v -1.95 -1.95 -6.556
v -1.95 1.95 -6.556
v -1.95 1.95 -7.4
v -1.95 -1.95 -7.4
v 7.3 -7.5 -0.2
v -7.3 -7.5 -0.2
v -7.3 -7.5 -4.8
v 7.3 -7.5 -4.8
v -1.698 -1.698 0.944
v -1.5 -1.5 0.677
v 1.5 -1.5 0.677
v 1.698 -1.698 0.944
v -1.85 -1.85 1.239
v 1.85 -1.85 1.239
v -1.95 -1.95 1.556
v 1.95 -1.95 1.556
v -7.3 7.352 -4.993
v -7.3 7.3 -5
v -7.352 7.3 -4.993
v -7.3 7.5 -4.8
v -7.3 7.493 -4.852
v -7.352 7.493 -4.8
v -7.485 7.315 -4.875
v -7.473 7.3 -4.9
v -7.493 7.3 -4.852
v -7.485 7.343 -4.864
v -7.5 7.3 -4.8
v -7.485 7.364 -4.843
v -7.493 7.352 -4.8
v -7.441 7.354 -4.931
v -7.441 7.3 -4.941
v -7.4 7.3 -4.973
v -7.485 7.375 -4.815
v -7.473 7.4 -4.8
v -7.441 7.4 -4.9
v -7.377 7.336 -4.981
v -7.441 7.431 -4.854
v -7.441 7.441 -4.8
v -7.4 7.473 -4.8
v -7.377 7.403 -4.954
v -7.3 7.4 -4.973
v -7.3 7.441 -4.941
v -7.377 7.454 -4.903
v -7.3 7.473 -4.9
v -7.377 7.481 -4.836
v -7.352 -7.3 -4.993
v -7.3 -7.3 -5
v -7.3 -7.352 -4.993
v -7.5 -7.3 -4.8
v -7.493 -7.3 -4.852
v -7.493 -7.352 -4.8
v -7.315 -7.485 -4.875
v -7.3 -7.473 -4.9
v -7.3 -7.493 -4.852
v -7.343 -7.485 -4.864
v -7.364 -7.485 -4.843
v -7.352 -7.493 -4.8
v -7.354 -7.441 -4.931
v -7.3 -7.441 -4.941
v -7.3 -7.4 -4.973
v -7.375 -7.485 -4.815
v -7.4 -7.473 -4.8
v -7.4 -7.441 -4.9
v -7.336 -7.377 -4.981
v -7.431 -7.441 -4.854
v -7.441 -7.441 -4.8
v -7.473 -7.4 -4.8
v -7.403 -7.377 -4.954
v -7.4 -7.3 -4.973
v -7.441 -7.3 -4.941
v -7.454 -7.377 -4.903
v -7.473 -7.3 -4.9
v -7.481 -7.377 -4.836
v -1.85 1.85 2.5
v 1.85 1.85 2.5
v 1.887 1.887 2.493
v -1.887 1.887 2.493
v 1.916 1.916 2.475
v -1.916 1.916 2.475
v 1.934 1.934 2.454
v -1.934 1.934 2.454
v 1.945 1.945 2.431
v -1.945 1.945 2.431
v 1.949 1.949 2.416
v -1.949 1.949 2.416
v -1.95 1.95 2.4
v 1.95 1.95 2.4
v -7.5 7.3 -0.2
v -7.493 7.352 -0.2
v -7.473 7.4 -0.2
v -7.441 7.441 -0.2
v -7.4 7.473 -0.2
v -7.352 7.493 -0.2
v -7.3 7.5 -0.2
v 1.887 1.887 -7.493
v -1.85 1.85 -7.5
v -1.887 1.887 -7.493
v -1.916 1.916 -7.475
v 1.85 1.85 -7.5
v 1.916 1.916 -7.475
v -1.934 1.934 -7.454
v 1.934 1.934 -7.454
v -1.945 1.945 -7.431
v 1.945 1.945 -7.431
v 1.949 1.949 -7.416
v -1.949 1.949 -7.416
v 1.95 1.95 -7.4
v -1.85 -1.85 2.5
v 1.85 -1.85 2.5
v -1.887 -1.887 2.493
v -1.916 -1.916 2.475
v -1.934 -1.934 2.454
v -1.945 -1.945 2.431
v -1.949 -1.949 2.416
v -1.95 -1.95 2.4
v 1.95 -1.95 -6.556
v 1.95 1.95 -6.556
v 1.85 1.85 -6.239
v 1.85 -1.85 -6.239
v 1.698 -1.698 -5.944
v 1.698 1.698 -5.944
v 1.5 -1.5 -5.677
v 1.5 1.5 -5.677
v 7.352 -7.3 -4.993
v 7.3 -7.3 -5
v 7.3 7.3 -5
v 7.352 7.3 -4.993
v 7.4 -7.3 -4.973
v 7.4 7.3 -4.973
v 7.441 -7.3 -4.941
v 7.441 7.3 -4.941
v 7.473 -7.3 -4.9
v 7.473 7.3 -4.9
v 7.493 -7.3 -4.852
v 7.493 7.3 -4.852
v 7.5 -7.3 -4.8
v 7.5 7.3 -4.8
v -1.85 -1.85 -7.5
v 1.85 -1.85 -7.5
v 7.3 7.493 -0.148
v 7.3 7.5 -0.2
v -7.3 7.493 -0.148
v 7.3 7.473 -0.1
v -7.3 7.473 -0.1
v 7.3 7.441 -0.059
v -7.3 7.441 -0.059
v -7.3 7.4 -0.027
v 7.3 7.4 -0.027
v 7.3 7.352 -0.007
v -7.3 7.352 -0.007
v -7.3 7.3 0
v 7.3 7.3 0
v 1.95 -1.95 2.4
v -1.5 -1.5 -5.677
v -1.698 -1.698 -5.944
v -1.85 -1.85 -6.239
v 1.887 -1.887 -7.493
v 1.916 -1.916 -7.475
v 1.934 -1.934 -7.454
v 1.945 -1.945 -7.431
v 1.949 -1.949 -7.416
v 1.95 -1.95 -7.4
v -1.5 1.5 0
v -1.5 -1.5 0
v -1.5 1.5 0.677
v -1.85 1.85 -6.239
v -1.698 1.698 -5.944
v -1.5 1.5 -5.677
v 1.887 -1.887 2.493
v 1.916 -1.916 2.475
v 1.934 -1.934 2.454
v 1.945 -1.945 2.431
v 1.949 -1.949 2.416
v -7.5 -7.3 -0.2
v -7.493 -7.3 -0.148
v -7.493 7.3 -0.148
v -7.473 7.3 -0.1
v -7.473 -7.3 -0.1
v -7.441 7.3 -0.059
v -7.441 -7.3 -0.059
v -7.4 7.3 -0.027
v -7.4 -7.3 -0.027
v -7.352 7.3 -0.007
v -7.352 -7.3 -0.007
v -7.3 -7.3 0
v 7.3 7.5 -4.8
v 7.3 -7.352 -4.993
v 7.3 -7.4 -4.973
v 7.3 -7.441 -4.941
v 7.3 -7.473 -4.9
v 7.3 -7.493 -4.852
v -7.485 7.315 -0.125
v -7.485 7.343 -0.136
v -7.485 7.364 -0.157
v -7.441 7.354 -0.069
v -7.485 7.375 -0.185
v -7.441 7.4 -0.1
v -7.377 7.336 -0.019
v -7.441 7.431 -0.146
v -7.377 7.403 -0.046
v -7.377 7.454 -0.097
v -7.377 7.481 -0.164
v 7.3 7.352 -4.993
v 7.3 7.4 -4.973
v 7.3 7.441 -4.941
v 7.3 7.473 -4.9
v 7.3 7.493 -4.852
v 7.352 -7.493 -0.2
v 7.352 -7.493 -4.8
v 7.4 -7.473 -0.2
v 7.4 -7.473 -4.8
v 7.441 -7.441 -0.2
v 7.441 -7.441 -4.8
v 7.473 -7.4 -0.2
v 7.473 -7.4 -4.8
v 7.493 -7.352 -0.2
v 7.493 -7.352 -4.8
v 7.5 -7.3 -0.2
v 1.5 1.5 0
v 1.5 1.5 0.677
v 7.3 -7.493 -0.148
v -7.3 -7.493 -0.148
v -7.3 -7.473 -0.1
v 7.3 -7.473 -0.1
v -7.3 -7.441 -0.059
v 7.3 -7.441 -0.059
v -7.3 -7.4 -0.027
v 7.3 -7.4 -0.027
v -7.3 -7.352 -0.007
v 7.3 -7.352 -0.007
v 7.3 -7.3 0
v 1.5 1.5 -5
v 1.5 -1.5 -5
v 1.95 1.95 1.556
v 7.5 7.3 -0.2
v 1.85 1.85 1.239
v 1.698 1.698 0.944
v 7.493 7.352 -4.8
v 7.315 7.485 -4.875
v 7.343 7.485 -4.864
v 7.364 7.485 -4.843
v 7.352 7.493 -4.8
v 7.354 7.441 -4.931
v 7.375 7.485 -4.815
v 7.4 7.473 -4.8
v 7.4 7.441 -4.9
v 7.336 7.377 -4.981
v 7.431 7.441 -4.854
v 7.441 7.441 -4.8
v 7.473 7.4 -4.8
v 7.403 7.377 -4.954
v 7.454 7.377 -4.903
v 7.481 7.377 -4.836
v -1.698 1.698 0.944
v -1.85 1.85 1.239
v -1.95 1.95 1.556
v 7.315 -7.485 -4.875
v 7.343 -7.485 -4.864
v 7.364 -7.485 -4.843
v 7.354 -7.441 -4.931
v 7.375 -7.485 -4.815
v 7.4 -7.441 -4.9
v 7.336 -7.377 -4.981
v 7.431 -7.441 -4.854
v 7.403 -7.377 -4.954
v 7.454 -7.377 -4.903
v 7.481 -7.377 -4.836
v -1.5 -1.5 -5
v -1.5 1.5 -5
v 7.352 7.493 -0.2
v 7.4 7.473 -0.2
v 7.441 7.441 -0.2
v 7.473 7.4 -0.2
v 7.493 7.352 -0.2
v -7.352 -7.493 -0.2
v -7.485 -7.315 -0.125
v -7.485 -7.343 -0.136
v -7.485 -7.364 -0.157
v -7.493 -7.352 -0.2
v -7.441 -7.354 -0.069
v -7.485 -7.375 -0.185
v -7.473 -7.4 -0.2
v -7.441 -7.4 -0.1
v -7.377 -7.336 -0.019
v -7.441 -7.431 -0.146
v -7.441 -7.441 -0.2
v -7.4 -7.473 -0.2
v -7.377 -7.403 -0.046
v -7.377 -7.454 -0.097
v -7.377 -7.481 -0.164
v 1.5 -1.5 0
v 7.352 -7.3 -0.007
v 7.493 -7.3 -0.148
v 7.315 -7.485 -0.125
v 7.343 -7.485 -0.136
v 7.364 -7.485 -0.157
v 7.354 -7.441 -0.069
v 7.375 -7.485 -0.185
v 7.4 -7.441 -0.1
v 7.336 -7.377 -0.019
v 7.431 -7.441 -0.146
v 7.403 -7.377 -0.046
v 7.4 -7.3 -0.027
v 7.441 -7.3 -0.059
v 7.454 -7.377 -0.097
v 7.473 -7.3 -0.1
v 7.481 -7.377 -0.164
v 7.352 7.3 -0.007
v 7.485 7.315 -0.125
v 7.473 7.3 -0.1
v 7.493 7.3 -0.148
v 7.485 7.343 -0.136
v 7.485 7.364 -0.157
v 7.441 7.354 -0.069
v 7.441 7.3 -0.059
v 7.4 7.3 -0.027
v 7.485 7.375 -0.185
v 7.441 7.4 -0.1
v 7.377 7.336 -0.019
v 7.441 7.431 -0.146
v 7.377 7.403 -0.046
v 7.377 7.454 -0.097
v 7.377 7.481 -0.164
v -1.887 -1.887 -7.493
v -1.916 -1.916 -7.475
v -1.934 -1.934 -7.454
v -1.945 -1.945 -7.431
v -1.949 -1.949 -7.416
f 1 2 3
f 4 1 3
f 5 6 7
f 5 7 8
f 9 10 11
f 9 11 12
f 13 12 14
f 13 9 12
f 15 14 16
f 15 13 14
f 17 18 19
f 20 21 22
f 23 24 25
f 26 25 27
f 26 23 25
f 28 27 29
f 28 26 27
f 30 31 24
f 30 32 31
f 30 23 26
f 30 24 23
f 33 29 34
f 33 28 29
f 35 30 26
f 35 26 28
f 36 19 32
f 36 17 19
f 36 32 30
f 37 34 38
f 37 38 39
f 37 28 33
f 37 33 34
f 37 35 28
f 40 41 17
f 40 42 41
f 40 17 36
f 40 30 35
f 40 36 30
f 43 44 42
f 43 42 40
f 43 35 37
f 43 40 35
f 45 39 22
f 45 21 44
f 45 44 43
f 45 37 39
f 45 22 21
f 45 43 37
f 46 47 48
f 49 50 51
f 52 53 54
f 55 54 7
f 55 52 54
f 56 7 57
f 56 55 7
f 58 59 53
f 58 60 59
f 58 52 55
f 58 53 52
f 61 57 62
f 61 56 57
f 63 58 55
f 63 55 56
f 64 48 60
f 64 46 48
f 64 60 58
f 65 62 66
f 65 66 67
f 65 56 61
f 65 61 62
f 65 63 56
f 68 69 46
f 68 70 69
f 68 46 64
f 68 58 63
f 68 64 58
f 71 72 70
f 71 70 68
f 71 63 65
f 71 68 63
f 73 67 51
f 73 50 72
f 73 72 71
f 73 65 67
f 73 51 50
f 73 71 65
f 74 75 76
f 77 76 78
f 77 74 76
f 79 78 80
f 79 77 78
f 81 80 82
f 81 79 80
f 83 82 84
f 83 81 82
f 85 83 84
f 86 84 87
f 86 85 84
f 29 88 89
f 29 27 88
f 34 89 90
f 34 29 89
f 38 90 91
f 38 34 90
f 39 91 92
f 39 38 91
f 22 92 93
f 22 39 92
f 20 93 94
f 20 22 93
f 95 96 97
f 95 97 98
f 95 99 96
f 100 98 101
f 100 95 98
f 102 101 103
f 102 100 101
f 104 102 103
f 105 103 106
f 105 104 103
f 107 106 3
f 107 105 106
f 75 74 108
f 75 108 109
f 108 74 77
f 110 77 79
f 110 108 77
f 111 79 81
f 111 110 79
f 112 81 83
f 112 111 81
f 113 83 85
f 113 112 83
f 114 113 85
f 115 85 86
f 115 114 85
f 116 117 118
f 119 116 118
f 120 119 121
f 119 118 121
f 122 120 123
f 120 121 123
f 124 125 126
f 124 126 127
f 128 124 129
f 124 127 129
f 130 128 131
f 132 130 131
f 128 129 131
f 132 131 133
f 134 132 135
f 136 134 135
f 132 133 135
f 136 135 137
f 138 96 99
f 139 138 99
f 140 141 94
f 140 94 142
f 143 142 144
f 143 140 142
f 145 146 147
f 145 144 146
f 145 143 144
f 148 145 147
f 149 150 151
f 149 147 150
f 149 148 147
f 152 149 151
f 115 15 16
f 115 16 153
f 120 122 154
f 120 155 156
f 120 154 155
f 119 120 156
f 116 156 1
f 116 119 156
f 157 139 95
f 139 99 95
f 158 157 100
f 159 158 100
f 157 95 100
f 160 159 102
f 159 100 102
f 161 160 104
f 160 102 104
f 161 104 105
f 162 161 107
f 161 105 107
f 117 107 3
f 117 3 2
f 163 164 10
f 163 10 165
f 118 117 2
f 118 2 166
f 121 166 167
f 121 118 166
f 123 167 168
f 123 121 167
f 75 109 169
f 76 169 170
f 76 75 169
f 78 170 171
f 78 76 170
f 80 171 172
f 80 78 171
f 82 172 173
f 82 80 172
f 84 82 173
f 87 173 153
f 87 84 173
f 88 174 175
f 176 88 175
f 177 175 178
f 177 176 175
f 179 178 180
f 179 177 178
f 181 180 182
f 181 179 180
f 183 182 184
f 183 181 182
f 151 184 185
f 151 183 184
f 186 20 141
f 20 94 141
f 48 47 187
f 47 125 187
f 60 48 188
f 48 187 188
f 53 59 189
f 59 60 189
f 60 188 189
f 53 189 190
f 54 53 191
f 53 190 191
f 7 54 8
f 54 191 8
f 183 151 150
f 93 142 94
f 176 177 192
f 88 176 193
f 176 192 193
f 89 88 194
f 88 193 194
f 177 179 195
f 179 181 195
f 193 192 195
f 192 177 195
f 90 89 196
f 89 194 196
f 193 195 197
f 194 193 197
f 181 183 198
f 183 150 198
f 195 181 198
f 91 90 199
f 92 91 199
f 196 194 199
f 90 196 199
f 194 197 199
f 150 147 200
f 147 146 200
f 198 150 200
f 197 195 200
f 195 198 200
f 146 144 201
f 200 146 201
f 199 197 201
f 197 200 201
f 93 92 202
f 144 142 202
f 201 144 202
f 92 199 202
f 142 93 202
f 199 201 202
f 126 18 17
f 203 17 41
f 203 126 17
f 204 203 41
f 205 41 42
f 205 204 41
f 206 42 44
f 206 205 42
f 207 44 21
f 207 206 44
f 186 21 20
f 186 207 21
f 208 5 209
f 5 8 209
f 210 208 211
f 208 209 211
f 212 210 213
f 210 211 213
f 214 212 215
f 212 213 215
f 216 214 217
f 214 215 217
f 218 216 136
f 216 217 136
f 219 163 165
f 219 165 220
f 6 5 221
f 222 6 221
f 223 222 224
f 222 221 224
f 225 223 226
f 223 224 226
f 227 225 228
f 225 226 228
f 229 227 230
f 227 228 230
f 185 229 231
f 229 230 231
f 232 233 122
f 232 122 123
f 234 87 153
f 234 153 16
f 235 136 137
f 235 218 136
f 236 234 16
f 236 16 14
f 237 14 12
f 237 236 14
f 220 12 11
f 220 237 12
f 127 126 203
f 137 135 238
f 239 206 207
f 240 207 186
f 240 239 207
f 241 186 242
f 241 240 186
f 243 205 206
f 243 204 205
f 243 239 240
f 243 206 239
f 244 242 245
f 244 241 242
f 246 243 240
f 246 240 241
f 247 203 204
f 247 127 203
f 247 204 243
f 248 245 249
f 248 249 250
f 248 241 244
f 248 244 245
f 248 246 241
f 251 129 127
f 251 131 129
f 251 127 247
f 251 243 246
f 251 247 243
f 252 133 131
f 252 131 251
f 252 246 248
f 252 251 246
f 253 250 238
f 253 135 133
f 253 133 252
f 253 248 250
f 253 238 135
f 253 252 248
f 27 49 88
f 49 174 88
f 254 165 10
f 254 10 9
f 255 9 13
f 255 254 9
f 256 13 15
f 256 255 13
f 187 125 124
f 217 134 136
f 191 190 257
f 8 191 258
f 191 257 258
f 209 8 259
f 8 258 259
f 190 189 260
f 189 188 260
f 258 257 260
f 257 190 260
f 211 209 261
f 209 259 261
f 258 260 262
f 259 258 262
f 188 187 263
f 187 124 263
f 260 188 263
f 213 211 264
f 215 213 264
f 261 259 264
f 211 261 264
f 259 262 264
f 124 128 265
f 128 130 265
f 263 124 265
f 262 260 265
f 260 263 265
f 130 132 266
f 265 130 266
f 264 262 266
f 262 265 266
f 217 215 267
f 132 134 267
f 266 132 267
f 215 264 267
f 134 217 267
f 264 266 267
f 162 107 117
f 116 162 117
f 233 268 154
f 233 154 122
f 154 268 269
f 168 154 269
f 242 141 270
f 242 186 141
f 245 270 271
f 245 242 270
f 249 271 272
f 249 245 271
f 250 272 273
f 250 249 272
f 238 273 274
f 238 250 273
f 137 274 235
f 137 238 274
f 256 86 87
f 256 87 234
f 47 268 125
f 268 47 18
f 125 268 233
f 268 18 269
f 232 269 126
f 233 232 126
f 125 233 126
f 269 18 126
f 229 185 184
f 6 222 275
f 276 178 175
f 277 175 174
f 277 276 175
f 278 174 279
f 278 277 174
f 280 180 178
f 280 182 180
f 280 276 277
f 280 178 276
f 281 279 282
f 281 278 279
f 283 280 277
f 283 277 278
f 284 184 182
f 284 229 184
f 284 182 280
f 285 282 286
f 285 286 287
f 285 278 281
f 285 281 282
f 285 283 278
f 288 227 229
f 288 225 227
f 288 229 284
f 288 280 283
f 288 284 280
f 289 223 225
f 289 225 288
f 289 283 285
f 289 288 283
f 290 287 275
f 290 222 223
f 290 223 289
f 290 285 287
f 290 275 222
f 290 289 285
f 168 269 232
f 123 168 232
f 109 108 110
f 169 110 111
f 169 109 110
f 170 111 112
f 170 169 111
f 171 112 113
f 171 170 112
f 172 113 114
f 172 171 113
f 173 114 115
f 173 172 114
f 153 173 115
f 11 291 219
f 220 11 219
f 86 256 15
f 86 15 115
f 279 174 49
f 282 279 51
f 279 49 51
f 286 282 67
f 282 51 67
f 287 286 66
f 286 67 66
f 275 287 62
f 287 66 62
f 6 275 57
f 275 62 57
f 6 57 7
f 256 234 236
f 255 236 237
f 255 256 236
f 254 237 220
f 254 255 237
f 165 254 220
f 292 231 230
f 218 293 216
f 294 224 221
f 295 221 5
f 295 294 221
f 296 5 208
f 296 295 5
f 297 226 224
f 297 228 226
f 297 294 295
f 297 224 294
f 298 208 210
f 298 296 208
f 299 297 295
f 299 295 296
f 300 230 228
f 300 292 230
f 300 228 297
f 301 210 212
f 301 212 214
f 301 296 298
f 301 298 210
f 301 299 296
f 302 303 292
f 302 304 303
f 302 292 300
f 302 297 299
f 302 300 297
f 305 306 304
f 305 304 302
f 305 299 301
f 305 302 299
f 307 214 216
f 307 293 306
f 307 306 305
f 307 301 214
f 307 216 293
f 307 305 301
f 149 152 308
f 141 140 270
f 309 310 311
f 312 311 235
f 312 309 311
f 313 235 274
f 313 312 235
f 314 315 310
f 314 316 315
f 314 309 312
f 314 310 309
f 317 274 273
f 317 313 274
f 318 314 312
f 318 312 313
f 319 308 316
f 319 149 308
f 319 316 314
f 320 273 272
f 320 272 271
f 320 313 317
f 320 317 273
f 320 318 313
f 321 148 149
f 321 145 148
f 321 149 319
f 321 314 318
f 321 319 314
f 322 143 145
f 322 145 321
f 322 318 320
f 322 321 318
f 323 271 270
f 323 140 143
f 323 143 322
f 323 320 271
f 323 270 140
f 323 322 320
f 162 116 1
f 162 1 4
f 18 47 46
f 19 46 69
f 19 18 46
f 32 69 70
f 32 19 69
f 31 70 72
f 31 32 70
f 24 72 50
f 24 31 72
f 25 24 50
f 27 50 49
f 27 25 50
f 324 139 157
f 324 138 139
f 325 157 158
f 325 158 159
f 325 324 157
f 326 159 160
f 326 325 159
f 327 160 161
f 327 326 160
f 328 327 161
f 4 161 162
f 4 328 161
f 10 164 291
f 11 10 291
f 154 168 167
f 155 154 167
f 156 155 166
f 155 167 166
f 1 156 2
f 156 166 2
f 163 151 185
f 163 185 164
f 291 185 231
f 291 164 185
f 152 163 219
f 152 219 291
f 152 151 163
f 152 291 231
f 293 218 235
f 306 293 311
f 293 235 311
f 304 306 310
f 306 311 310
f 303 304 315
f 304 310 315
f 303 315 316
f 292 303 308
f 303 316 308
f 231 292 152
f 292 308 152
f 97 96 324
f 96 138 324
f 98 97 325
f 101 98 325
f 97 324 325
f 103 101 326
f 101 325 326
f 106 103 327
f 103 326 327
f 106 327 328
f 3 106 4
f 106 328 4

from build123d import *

# Parameters (mm, degrees)
SKETCH_1_W                      = 15
SKETCH_1_H                      = 15
EXTRUDE_1_DEPTH                 = 5
SKETCH_2_W                      = 3
SKETCH_2_H                      = 3
EXTRUDE_2_DEPTH                 = 1
EXTRUDE_3_DEPTH                 = 2
CUT_EXTRUDE_1_REACH             = 13.726
CUT_EXTRUDE_1_DIRECTION_2_REACH = 13.726
FILLET_1_R                      = 0.1
FILLET_1_OF_MIRROR_1_R          = 0.1
FILLET_2_R                      = 0.2


with BuildPart() as part:
    # 草图1 → 凸台-拉伸1 (new body)
    with BuildSketch(Plane.XY):
        Rectangle(SKETCH_1_W, SKETCH_1_H)
    extrude(amount=-EXTRUDE_1_DEPTH)

    # 草图2 → 凸台-拉伸2 (add)
    with BuildSketch(Plane.XY):
        Rectangle(SKETCH_2_W, SKETCH_2_H)
    extrude_2 = extrude(amount=EXTRUDE_2_DEPTH)

    # 草图3 → 凸台-拉伸3 (add, symmetric)
    with BuildSketch(Plane(origin=(0, 0, 0), x_dir=(1, 0, 0), z_dir=(0, 1, 0))):
        with BuildLine():
            Line((-1.95, -2.5), (1.95, -2.5))
            Line((1.95, -2.5), (1.95, -1.555590279))
            ThreePointArc((1.95, -1.555590279), (1.780042303, -1.088161527), (1.5, -0.677124344))
            Line((1.5, -0.677124344), (-1.5, -0.677124344))
            ThreePointArc((-1.5, -0.677124344), (-1.780042303, -1.088161527), (-1.95, -1.555590279))
            Line((-1.95, -1.555590279), (-1.95, -2.5))
        make_face()
    extrude_3 = extrude(amount=EXTRUDE_3_DEPTH, both=True)

    # 草图4 → 切除-拉伸1 (cut, up to next)
    with BuildSketch(Plane(origin=(0, 0, 0), x_dir=(0, 0, -1), z_dir=(1, 0, 0)), mode=Mode.PRIVATE) as cut_extrude_1_sk1:
        with BuildLine():
            Line((-2.5, 1.95), (-1.555590279, 1.95))
            ThreePointArc((-1.555590279, 1.95), (-1.088161527, 1.780042303), (-0.677124344, 1.5))
            Line((-0.677124344, 1.5), (-0.677124344, 2))
            Line((-0.677124344, 2), (-2.5, 2))
            Line((-2.5, 2), (-2.5, 1.95))
        make_face()
    cut_extrude_1_tool1 = extrude(cut_extrude_1_sk1.sketch, amount=-CUT_EXTRUDE_1_REACH, mode=Mode.PRIVATE) & part.part
    # 草图4 → 切除-拉伸1 (cut, up to next)
    with BuildSketch(Plane(origin=(0, 0, 0), x_dir=(0, 0, -1), z_dir=(1, 0, 0)), mode=Mode.PRIVATE) as cut_extrude_1_sk2:
        with BuildLine():
            Line((-2.5, -2), (-0.677124344, -2))
            Line((-0.677124344, -2), (-0.677124344, -1.5))
            ThreePointArc((-0.677124344, -1.5), (-1.088161527, -1.780042303), (-1.555590279, -1.95))
            Line((-1.555590279, -1.95), (-2.5, -1.95))
            Line((-2.5, -1.95), (-2.5, -2))
        make_face()
    cut_extrude_1_tool2 = extrude(cut_extrude_1_sk2.sketch, amount=-CUT_EXTRUDE_1_REACH, mode=Mode.PRIVATE) & part.part
    cut_extrude_1_1 = cut_extrude_1_tool1.solids().sort_by_distance((0, 1.873038, 1.175075))[0]
    add(cut_extrude_1_1, mode=Mode.SUBTRACT)
    cut_extrude_1_2 = cut_extrude_1_tool2.solids().sort_by_distance((0, -1.873038, 1.175075))[0]
    add(cut_extrude_1_2, mode=Mode.SUBTRACT)
    cut_extrude_1 = cut_extrude_1_1 + cut_extrude_1_2  # 切除-拉伸1 as one shape, for the pattern or mirror that repeats it

    # 草图4 → 切除-拉伸1 direction 2 (cut, up to next)
    with BuildSketch(Plane(origin=(0, 0, 0), x_dir=(0, 0, -1), z_dir=(1, 0, 0)), mode=Mode.PRIVATE) as cut_extrude_1_direction_2_sk1:
        with BuildLine():
            Line((-2.5, 1.95), (-1.555590279, 1.95))
            ThreePointArc((-1.555590279, 1.95), (-1.088161527, 1.780042303), (-0.677124344, 1.5))
            Line((-0.677124344, 1.5), (-0.677124344, 2))
            Line((-0.677124344, 2), (-2.5, 2))
            Line((-2.5, 2), (-2.5, 1.95))
        make_face()
    cut_extrude_1_direction_2_tool1 = extrude(cut_extrude_1_direction_2_sk1.sketch, amount=CUT_EXTRUDE_1_DIRECTION_2_REACH, mode=Mode.PRIVATE) & part.part
    # 草图4 → 切除-拉伸1 direction 2 (cut, up to next)
    with BuildSketch(Plane(origin=(0, 0, 0), x_dir=(0, 0, -1), z_dir=(1, 0, 0)), mode=Mode.PRIVATE) as cut_extrude_1_direction_2_sk2:
        with BuildLine():
            Line((-2.5, -2), (-0.677124344, -2))
            Line((-0.677124344, -2), (-0.677124344, -1.5))
            ThreePointArc((-0.677124344, -1.5), (-1.088161527, -1.780042303), (-1.555590279, -1.95))
            Line((-1.555590279, -1.95), (-2.5, -1.95))
            Line((-2.5, -1.95), (-2.5, -2))
        make_face()
    cut_extrude_1_direction_2_tool2 = extrude(cut_extrude_1_direction_2_sk2.sketch, amount=CUT_EXTRUDE_1_DIRECTION_2_REACH, mode=Mode.PRIVATE) & part.part
    cut_extrude_1_direction_2_1 = cut_extrude_1_direction_2_tool1.solids().sort_by_distance((0, 1.873038, 1.175075))[0]
    add(cut_extrude_1_direction_2_1, mode=Mode.SUBTRACT)
    cut_extrude_1_direction_2_2 = cut_extrude_1_direction_2_tool2.solids().sort_by_distance((0, -1.873038, 1.175075))[0]
    add(cut_extrude_1_direction_2_2, mode=Mode.SUBTRACT)
    cut_extrude_1_direction_2 = cut_extrude_1_direction_2_1 + cut_extrude_1_direction_2_2  # 切除-拉伸1 direction 2 as one shape, for the pattern or mirror that repeats it

    # 圆角1
    fillet_1_edges = [part.edges().sort_by_distance(p)[0] for p in [
        (-1.95, 0, 2.5),
        (1.95, 0, 2.5),
        (0, -1.95, 2.5),
        (0, 1.95, 2.5),
    ]]
    fillet(fillet_1_edges, radius=FILLET_1_R)

    # 镜向1: 凸台-拉伸2, 凸台-拉伸3, 切除-拉伸1, 切除-拉伸1 direction 2 across plane
    add(extrude_2.mirror(Plane.XY.offset(-2.5)))
    add(extrude_3.mirror(Plane.XY.offset(-2.5)))
    add(cut_extrude_1.mirror(Plane.XY.offset(-2.5)), mode=Mode.SUBTRACT)
    add(cut_extrude_1_direction_2.mirror(Plane.XY.offset(-2.5)), mode=Mode.SUBTRACT)

    # 圆角1 of 镜向1
    fillet_1_of_mirror_1_edges = [part.edges().sort_by_distance(p)[0] for p in [
        (-1.95, 0, -7.5),
        (1.95, 0, -7.5),
        (0, -1.95, -7.5),
        (0, 1.95, -7.5),
    ]]
    fillet(fillet_1_of_mirror_1_edges, radius=FILLET_1_OF_MIRROR_1_R)

    # 圆角2
    fillet_2_edges = [part.edges().sort_by_distance(p)[0] for p in [
        (7.5, 0, -5),
        (0, 7.5, -5),
        (-7.5, 0, -5),
        (0, 7.5, 0),
        (7.5, 0, 0),
        (0, -7.5, 0),
        (-7.5, 0, 0),
        (0, -7.5, -5),
        (-7.5, 7.5, -2.5),
        (7.5, 7.5, -2.5),
        (7.5, -7.5, -2.5),
        (-7.5, -7.5, -2.5),
    ]]
    fillet(fillet_2_edges, radius=FILLET_2_R)


solid = part.part
